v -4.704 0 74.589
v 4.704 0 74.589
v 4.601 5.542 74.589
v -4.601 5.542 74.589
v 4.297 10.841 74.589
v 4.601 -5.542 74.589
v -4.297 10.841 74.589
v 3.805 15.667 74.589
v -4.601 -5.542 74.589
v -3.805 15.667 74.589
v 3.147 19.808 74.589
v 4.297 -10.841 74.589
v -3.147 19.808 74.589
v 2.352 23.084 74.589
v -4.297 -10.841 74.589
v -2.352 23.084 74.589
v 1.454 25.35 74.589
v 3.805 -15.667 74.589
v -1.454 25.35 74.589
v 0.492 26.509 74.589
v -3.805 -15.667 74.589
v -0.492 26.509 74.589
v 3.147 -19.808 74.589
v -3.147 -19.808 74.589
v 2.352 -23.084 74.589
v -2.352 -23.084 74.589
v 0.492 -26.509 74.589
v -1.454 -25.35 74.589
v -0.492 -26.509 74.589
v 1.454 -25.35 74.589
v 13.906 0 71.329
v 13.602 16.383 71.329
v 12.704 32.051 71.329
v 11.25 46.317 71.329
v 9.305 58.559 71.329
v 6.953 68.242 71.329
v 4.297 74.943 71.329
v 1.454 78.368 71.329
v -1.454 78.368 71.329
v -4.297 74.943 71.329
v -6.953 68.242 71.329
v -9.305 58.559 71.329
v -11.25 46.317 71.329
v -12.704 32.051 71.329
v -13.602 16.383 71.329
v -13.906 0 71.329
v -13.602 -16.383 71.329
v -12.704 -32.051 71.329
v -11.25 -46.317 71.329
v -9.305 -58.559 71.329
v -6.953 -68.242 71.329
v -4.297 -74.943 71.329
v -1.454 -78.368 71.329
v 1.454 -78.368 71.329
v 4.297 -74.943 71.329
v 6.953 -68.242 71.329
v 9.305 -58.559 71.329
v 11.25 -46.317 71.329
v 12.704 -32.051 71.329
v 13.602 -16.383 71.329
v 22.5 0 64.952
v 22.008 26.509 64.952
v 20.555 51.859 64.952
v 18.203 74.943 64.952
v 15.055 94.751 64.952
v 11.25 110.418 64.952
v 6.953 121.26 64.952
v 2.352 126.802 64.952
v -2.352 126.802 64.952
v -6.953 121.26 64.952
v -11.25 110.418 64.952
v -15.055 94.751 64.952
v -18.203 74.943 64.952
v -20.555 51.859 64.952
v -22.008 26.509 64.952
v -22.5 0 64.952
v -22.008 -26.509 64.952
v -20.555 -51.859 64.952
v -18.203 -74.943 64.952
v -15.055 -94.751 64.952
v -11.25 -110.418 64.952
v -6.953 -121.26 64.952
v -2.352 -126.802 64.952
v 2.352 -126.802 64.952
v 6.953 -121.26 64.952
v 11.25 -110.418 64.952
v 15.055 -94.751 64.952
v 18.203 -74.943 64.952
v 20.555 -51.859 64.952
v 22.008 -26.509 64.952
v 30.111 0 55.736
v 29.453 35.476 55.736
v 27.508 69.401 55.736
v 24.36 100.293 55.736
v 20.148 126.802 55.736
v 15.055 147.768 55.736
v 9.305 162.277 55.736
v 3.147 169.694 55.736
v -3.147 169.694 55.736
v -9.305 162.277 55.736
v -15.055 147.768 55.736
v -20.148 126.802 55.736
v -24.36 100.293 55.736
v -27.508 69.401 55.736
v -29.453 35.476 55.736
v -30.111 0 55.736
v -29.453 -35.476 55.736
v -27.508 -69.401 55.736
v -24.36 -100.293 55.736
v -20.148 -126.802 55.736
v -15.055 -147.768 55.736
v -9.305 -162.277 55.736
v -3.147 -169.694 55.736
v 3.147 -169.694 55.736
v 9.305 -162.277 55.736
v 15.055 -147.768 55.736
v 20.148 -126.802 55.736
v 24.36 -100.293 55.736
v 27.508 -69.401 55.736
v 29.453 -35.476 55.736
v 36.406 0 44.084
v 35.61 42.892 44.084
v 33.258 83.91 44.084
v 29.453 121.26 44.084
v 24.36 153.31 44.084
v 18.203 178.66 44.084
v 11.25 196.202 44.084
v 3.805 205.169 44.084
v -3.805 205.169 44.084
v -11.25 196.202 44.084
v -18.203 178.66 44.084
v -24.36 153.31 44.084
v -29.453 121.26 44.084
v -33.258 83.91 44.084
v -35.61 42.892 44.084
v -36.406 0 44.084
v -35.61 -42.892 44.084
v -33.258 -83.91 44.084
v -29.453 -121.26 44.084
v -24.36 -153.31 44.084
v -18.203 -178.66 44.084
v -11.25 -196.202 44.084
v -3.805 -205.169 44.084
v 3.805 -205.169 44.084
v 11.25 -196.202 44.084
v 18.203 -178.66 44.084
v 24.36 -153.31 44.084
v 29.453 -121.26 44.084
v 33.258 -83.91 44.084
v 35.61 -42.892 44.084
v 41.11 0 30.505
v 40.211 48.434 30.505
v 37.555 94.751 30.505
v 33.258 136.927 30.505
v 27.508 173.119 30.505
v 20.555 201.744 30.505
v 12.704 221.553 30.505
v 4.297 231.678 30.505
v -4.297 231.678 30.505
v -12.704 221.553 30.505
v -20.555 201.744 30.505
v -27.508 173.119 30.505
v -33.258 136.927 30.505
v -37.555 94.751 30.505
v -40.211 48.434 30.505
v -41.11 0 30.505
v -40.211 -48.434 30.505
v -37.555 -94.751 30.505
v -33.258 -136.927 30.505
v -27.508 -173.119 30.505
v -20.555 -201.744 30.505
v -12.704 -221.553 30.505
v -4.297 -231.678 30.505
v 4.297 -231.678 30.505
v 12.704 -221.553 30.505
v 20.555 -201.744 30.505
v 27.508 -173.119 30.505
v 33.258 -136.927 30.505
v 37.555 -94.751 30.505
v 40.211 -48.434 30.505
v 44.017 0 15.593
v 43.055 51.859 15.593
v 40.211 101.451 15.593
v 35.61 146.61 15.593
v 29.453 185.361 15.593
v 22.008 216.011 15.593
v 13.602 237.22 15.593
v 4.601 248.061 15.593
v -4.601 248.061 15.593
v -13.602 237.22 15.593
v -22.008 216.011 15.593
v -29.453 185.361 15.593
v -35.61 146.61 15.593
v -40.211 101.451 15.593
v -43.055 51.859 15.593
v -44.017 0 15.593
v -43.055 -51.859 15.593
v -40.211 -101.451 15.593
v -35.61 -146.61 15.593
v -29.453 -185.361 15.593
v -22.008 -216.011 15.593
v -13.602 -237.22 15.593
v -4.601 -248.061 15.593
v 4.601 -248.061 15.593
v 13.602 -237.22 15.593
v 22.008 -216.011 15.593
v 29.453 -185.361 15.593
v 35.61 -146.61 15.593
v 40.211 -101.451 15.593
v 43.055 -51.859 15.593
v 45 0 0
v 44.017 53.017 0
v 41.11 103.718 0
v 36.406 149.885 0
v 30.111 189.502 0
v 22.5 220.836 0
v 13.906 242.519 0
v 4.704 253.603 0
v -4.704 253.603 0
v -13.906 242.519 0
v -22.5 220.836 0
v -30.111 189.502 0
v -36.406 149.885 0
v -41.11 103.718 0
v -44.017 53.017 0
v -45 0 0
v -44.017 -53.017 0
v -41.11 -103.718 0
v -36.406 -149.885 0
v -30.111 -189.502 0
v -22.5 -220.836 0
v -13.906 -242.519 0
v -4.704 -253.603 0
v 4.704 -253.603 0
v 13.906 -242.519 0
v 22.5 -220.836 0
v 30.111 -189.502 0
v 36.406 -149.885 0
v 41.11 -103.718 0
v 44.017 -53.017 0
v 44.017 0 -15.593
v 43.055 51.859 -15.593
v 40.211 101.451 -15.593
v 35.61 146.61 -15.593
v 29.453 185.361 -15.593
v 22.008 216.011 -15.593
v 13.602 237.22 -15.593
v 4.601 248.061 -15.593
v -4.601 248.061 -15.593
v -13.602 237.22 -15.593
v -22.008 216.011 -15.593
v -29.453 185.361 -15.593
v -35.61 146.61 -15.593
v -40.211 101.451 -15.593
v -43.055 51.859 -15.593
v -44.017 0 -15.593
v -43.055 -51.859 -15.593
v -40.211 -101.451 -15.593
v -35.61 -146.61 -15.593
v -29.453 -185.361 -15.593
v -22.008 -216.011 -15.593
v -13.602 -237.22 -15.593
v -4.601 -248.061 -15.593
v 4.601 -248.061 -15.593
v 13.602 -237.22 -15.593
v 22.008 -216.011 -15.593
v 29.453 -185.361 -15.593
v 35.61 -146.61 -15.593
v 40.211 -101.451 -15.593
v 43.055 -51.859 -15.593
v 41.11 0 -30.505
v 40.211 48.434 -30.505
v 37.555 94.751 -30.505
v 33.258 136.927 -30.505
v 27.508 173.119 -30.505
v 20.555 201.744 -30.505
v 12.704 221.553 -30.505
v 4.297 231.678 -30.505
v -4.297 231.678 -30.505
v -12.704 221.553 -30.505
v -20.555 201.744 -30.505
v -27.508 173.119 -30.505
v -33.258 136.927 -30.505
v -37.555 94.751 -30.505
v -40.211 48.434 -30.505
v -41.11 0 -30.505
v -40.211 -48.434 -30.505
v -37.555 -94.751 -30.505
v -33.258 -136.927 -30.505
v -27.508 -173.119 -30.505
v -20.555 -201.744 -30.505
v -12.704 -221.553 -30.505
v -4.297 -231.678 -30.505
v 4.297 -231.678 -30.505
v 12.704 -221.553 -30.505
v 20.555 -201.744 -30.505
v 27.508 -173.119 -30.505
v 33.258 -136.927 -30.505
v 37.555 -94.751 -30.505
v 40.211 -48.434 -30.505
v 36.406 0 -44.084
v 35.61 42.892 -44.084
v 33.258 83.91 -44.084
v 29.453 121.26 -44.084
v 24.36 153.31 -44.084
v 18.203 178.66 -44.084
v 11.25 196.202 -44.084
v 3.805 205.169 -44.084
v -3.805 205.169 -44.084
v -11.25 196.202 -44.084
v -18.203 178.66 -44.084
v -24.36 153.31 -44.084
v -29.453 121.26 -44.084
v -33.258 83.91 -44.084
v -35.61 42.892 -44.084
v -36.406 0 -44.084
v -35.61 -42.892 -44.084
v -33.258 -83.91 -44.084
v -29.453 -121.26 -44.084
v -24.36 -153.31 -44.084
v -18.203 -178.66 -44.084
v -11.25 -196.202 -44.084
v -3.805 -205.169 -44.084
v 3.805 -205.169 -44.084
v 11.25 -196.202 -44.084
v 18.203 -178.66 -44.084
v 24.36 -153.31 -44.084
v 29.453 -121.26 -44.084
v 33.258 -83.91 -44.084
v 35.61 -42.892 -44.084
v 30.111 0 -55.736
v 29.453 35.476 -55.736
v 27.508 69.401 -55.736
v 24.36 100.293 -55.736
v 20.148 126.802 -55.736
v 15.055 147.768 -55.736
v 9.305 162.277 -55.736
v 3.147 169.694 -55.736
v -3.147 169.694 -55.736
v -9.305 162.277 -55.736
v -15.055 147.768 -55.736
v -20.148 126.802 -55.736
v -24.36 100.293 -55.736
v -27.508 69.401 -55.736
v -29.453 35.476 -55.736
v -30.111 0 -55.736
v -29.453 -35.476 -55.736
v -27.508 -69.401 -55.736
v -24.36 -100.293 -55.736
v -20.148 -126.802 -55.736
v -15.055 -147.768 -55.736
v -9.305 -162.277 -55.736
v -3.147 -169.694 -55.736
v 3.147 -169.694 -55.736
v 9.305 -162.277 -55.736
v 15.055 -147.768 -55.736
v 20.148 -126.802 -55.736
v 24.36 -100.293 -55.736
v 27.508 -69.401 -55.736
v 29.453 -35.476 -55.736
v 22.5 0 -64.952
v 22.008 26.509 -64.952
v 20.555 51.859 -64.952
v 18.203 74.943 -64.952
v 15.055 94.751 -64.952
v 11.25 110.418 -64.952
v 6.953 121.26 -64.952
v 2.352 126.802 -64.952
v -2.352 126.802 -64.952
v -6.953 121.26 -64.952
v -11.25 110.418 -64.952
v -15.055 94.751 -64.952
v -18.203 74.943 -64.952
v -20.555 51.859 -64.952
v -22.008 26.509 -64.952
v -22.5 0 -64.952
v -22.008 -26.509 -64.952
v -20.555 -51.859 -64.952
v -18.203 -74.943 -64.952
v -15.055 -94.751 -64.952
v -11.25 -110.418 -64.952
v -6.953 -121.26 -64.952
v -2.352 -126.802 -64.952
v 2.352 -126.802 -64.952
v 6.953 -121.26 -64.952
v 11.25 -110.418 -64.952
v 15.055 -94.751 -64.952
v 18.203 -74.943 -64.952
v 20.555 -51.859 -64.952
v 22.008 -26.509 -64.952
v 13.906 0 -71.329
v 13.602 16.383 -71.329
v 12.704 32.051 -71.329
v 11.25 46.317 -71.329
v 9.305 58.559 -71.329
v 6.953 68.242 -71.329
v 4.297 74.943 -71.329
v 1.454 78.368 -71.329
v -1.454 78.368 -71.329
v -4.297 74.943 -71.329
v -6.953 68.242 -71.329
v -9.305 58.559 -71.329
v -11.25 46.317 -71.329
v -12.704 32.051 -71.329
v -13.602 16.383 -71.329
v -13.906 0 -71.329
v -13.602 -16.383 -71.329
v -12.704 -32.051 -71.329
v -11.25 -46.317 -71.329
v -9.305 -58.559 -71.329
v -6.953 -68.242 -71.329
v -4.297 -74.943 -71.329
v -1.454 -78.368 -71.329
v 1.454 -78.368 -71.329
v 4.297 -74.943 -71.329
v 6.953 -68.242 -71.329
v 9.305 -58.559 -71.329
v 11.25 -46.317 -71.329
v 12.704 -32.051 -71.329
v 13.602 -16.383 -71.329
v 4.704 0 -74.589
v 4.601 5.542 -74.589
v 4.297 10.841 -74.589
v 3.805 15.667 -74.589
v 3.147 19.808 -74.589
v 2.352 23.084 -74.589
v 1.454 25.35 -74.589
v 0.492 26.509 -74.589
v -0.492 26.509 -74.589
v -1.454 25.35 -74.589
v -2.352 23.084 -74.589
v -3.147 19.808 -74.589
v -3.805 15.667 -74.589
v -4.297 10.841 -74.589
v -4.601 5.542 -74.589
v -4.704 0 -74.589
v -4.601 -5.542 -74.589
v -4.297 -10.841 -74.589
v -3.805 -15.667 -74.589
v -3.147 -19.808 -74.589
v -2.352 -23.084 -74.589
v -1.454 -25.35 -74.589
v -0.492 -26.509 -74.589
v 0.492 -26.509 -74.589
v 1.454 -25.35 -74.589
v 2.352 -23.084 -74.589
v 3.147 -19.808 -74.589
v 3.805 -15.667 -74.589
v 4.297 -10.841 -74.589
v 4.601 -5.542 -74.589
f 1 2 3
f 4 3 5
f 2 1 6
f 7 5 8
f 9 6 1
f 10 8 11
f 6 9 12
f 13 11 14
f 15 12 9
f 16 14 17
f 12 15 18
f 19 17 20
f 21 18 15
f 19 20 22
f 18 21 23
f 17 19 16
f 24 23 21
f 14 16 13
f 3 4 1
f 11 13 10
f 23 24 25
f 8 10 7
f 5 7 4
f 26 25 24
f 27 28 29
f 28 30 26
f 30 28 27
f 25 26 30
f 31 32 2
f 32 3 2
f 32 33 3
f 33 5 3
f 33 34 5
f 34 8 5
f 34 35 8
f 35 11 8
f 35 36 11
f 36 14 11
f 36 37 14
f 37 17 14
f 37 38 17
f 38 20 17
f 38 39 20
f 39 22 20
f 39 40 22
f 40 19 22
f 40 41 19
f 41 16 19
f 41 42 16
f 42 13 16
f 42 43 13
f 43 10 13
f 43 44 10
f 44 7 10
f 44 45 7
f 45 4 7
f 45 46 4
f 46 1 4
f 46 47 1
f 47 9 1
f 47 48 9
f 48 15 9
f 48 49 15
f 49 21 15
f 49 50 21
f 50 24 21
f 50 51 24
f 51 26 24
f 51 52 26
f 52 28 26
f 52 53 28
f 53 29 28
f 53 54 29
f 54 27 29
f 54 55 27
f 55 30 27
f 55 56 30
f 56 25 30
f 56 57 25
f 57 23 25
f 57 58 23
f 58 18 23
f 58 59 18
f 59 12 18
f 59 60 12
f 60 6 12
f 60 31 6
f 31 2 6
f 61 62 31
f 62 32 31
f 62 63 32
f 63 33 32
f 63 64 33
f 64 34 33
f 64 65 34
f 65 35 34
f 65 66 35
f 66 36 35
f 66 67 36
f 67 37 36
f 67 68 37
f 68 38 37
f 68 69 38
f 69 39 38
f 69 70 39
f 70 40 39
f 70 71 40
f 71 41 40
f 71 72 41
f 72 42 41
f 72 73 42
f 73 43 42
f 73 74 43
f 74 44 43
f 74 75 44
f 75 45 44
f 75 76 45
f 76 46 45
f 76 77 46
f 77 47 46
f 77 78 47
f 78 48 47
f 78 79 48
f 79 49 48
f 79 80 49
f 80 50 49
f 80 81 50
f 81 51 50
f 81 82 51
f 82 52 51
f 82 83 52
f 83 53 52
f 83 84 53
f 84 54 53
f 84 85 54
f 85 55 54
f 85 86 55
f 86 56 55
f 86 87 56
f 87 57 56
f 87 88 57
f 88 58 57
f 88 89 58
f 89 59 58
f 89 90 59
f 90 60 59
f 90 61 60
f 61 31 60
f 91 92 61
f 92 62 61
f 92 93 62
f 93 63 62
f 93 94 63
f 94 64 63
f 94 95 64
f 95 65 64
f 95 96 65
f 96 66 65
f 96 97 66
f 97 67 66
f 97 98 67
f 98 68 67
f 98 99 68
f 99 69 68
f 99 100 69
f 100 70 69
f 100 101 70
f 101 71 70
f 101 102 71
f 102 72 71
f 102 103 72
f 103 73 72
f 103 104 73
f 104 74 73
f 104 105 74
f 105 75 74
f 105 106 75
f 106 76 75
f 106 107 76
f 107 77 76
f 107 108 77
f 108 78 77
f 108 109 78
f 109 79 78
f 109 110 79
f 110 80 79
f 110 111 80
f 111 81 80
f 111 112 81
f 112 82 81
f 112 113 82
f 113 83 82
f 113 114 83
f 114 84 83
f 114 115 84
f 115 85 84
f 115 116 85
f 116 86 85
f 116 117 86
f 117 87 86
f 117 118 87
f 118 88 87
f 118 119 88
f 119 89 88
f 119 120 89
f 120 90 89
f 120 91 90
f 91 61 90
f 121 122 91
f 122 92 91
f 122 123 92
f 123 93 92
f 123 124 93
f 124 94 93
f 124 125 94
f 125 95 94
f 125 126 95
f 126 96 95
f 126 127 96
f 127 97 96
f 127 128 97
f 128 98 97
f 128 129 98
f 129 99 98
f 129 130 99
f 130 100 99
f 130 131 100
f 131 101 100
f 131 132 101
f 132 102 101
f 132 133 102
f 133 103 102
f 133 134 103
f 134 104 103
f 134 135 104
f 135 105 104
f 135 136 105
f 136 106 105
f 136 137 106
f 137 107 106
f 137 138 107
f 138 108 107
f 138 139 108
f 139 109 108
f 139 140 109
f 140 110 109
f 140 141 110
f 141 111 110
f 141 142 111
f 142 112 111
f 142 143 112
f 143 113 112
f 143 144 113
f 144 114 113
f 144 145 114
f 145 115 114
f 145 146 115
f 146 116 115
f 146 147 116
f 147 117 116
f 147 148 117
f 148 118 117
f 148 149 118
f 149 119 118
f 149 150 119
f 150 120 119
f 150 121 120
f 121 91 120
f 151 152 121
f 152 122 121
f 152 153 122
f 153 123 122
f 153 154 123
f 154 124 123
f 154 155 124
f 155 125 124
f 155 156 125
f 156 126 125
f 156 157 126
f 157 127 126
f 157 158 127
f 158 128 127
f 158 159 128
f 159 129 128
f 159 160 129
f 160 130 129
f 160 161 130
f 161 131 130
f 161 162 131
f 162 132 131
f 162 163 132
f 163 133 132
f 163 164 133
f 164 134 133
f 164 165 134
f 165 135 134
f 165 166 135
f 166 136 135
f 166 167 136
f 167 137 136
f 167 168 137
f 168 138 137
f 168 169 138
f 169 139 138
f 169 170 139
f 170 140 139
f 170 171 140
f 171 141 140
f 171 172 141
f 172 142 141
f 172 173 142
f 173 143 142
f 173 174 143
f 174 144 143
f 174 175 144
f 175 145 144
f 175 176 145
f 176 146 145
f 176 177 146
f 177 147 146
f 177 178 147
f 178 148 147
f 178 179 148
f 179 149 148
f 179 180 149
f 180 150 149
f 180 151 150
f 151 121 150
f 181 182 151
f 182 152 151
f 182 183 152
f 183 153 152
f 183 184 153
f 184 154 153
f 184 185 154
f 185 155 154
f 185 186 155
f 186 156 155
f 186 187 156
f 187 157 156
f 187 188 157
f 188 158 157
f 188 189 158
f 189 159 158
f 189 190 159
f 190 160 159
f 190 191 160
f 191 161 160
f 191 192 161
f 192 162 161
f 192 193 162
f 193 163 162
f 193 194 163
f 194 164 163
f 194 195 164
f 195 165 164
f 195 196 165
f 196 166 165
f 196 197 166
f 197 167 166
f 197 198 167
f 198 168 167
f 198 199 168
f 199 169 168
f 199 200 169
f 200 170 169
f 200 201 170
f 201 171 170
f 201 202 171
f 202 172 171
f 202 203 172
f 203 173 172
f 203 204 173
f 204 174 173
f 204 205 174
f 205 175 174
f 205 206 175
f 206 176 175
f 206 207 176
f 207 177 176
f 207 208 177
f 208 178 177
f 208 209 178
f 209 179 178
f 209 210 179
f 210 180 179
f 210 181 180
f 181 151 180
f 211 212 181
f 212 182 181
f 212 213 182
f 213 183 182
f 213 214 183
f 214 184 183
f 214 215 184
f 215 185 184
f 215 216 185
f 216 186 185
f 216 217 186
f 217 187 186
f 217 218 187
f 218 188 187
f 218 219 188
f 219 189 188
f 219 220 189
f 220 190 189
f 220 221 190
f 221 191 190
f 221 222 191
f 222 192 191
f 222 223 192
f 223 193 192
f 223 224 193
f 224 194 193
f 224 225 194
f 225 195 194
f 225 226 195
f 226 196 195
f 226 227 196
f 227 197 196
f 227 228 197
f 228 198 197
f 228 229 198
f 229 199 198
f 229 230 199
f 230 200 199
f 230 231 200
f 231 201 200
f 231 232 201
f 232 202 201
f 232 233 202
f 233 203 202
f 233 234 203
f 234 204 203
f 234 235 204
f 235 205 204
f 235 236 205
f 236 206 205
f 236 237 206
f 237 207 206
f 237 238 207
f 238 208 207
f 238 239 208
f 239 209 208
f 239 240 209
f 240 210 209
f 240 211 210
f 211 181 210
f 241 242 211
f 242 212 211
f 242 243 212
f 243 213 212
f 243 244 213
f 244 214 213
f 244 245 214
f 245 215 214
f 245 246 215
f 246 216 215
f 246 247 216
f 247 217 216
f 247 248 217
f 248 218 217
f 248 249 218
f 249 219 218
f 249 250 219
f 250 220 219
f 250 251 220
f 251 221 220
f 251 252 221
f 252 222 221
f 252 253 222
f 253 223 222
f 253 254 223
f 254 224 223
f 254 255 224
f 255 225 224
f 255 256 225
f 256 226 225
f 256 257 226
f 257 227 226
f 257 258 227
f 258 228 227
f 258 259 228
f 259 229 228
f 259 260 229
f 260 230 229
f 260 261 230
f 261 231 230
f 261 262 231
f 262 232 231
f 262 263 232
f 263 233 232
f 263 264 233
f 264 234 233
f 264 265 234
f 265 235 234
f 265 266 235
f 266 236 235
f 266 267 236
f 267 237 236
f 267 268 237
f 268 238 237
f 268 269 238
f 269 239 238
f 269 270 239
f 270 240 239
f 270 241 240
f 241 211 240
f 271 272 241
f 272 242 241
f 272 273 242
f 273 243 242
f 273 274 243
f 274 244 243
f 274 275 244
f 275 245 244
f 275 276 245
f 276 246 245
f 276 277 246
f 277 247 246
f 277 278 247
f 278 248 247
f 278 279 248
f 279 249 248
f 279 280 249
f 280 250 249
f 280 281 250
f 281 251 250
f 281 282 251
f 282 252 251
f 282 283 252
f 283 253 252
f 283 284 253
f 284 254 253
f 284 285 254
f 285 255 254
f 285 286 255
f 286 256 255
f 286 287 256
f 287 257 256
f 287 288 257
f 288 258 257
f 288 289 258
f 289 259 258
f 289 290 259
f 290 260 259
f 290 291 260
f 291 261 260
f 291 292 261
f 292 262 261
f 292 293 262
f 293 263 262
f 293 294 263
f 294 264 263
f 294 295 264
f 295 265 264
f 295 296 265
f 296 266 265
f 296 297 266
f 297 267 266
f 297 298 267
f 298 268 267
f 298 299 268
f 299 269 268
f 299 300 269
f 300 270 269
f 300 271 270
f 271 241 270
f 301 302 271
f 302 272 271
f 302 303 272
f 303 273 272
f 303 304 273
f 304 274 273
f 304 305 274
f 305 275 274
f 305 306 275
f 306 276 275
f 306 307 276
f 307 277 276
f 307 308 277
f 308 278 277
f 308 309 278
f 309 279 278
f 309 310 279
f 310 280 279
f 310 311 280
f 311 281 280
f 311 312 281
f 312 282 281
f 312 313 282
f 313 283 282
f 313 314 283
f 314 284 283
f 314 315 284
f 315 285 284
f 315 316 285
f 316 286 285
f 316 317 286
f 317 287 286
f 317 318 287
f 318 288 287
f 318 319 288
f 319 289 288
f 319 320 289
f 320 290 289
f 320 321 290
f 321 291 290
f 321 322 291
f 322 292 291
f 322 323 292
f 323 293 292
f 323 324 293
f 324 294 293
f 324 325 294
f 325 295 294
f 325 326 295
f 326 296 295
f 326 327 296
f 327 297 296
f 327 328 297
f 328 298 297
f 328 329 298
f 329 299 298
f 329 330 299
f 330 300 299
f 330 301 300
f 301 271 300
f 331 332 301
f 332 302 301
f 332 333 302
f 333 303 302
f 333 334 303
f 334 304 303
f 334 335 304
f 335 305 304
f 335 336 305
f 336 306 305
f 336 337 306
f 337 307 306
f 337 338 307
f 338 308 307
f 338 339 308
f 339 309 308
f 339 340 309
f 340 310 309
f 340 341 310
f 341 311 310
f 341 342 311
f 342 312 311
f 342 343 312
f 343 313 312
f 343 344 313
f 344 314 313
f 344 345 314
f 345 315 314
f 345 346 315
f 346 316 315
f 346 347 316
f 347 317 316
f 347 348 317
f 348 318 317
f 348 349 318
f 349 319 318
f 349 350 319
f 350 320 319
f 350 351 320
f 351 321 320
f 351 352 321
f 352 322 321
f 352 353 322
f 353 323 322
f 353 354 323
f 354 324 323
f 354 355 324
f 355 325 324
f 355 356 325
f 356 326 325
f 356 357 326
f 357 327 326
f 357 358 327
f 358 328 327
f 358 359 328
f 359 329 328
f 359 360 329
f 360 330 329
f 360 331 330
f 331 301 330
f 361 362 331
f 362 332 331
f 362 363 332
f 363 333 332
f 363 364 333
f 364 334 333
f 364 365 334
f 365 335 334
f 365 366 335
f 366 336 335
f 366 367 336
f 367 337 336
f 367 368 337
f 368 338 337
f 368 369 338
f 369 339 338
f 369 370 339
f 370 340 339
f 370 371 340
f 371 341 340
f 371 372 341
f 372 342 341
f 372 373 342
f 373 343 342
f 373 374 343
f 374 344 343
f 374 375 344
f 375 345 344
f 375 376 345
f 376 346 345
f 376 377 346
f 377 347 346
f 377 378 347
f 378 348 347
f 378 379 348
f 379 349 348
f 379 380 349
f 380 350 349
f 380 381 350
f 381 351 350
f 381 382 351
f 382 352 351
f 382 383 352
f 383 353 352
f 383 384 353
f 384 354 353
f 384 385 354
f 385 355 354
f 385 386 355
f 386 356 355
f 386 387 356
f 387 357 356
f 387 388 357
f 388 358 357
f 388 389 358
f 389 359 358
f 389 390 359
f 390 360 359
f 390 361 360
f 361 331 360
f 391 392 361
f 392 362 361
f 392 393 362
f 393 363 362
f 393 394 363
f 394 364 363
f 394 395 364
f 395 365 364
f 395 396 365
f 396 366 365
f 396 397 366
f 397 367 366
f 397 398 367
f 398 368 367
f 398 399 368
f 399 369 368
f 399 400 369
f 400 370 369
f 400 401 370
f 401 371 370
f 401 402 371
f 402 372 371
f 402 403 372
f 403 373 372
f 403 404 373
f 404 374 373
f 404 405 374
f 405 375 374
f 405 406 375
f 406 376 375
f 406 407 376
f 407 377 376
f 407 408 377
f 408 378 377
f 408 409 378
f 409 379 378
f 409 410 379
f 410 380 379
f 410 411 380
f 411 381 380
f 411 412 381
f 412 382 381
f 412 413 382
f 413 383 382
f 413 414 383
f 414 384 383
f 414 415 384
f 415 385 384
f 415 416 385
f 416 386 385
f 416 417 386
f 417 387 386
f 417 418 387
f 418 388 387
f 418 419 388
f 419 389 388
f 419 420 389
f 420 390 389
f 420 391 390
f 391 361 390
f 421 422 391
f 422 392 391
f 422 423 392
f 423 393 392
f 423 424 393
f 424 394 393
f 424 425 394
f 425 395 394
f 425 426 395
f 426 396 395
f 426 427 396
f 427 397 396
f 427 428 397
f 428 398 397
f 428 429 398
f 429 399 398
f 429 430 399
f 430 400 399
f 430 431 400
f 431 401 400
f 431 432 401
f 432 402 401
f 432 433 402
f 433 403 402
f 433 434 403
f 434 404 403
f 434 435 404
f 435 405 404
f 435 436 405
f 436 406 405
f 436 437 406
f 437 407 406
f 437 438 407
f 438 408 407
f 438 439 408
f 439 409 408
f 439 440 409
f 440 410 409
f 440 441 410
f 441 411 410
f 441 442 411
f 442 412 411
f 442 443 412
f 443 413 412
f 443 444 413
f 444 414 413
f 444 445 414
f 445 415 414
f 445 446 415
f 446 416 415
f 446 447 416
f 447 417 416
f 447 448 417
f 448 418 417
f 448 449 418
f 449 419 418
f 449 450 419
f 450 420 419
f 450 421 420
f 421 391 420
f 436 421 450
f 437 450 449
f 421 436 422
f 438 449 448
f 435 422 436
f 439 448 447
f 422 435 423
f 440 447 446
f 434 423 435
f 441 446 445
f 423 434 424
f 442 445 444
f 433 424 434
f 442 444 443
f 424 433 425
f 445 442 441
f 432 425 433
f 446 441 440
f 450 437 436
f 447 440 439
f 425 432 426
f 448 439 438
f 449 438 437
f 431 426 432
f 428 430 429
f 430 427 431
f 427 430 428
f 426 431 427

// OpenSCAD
// Generated by SolidPython 1.0.1 on 2020-07-29 00:46:45


scale(v = [3, 17, 5]) {
	sphere(r = 15);
}
/***********************************************
*********      SolidPython code:      **********
************************************************
 
# import packages: SolidPython
from solid import *
from solid.utils import *
from itertools import chain, combinations, permutations


class Resize:

    def __init__(self, scad_file):
        self.scad_file = scad_file
        #self.scad_file = import_scad(scad_file)
        # cone/cylinder param:
        self.r1 = 0
        self.r2 = 0
        self.h = 0
        # rectangular prism param:
        self.w = 0
        self.l = 0
        # ellipse param:
        self.r = 0

    # import OpenScad code (file name corresponds to shape)


    # classify shape + parameters
    def assign(self, param1, param2, param3):
        if self.scad_file == 'cone.scad':
            self.r1 = param1
            self.r2 = param2
            self.h = param3
        elif self.scad_file == 'cylinder.scad':
            self.r1 = param1
            self.r2 = param2
            self.h = param3
        elif self.scad_file == 'rectangularPrism.scad':
            self.h = param1
            self.l = param2
            self.w = param3
        else:
            self.r = param1
            self.h = param2

    # resize parameters
    def iterate(self):
        x = range(3, 20, 2)
        i = 1
        if self.scad_file == 'cone.scad':
            tempList = list(permutations(x, 2))
            for temp in tempList:
                param1 = temp[0]
                param2 = temp[1]
                filepath = 'produced_scad_files/' + 'cone' + str(param1) + '_' + str(param2) + '_' + '.scad'
                scad_render_to_file(cylinder(h=param1, r1=param2, r2=0), filepath)

        elif self.scad_file == 'cylinder.scad':
            tempList = list(permutations(x, 3))
            for temp in tempList:
                param1 = temp[0]
                param2 = temp[1]
                filepath = 'produced_scad_files/' + 'cylinder' + str(param1) + '_' + str(param2) + '_' + '.scad'
                scad_render_to_file(cylinder(h=param1, r1=param2, r2=param2), filepath)

        elif self.scad_file == 'rectangularPrism.scad':
            tempList = list(permutations(x, 3))
            for temp in tempList:
                param1 = temp[0]
                param2 = temp[1]
                param3 = temp[2]
                filepath = 'produced_scad_files/' + 'rectangularPrism' + str(param1) + '_' + str(param2) + '_' + str(
                    param3) + '.scad'
                scad_render_to_file(cube(size=(param1, param2, param3)), filepath)

        elif self.scad_file == 'ellipse.scad':
            tempList = list(permutations(x, 4))
            for temp in tempList:
                param1 = temp[0]
                param2 = temp[1]
                param3 = temp[2]
                param4 = temp[3]
                filepath = 'produced_scad_files/' + 'ellipse' + str(param1) + '_' + str(param2) + '_' + str(param3) + '_' + str(param4) + '.scad'
                scad_render_to_file(scale([param1, param2, param3])(sphere(r=param4)), filepath)

    def render_to_scadfile(self):
        scad_render_to_file(scad, 'example.scad') 
 
************************************************/
